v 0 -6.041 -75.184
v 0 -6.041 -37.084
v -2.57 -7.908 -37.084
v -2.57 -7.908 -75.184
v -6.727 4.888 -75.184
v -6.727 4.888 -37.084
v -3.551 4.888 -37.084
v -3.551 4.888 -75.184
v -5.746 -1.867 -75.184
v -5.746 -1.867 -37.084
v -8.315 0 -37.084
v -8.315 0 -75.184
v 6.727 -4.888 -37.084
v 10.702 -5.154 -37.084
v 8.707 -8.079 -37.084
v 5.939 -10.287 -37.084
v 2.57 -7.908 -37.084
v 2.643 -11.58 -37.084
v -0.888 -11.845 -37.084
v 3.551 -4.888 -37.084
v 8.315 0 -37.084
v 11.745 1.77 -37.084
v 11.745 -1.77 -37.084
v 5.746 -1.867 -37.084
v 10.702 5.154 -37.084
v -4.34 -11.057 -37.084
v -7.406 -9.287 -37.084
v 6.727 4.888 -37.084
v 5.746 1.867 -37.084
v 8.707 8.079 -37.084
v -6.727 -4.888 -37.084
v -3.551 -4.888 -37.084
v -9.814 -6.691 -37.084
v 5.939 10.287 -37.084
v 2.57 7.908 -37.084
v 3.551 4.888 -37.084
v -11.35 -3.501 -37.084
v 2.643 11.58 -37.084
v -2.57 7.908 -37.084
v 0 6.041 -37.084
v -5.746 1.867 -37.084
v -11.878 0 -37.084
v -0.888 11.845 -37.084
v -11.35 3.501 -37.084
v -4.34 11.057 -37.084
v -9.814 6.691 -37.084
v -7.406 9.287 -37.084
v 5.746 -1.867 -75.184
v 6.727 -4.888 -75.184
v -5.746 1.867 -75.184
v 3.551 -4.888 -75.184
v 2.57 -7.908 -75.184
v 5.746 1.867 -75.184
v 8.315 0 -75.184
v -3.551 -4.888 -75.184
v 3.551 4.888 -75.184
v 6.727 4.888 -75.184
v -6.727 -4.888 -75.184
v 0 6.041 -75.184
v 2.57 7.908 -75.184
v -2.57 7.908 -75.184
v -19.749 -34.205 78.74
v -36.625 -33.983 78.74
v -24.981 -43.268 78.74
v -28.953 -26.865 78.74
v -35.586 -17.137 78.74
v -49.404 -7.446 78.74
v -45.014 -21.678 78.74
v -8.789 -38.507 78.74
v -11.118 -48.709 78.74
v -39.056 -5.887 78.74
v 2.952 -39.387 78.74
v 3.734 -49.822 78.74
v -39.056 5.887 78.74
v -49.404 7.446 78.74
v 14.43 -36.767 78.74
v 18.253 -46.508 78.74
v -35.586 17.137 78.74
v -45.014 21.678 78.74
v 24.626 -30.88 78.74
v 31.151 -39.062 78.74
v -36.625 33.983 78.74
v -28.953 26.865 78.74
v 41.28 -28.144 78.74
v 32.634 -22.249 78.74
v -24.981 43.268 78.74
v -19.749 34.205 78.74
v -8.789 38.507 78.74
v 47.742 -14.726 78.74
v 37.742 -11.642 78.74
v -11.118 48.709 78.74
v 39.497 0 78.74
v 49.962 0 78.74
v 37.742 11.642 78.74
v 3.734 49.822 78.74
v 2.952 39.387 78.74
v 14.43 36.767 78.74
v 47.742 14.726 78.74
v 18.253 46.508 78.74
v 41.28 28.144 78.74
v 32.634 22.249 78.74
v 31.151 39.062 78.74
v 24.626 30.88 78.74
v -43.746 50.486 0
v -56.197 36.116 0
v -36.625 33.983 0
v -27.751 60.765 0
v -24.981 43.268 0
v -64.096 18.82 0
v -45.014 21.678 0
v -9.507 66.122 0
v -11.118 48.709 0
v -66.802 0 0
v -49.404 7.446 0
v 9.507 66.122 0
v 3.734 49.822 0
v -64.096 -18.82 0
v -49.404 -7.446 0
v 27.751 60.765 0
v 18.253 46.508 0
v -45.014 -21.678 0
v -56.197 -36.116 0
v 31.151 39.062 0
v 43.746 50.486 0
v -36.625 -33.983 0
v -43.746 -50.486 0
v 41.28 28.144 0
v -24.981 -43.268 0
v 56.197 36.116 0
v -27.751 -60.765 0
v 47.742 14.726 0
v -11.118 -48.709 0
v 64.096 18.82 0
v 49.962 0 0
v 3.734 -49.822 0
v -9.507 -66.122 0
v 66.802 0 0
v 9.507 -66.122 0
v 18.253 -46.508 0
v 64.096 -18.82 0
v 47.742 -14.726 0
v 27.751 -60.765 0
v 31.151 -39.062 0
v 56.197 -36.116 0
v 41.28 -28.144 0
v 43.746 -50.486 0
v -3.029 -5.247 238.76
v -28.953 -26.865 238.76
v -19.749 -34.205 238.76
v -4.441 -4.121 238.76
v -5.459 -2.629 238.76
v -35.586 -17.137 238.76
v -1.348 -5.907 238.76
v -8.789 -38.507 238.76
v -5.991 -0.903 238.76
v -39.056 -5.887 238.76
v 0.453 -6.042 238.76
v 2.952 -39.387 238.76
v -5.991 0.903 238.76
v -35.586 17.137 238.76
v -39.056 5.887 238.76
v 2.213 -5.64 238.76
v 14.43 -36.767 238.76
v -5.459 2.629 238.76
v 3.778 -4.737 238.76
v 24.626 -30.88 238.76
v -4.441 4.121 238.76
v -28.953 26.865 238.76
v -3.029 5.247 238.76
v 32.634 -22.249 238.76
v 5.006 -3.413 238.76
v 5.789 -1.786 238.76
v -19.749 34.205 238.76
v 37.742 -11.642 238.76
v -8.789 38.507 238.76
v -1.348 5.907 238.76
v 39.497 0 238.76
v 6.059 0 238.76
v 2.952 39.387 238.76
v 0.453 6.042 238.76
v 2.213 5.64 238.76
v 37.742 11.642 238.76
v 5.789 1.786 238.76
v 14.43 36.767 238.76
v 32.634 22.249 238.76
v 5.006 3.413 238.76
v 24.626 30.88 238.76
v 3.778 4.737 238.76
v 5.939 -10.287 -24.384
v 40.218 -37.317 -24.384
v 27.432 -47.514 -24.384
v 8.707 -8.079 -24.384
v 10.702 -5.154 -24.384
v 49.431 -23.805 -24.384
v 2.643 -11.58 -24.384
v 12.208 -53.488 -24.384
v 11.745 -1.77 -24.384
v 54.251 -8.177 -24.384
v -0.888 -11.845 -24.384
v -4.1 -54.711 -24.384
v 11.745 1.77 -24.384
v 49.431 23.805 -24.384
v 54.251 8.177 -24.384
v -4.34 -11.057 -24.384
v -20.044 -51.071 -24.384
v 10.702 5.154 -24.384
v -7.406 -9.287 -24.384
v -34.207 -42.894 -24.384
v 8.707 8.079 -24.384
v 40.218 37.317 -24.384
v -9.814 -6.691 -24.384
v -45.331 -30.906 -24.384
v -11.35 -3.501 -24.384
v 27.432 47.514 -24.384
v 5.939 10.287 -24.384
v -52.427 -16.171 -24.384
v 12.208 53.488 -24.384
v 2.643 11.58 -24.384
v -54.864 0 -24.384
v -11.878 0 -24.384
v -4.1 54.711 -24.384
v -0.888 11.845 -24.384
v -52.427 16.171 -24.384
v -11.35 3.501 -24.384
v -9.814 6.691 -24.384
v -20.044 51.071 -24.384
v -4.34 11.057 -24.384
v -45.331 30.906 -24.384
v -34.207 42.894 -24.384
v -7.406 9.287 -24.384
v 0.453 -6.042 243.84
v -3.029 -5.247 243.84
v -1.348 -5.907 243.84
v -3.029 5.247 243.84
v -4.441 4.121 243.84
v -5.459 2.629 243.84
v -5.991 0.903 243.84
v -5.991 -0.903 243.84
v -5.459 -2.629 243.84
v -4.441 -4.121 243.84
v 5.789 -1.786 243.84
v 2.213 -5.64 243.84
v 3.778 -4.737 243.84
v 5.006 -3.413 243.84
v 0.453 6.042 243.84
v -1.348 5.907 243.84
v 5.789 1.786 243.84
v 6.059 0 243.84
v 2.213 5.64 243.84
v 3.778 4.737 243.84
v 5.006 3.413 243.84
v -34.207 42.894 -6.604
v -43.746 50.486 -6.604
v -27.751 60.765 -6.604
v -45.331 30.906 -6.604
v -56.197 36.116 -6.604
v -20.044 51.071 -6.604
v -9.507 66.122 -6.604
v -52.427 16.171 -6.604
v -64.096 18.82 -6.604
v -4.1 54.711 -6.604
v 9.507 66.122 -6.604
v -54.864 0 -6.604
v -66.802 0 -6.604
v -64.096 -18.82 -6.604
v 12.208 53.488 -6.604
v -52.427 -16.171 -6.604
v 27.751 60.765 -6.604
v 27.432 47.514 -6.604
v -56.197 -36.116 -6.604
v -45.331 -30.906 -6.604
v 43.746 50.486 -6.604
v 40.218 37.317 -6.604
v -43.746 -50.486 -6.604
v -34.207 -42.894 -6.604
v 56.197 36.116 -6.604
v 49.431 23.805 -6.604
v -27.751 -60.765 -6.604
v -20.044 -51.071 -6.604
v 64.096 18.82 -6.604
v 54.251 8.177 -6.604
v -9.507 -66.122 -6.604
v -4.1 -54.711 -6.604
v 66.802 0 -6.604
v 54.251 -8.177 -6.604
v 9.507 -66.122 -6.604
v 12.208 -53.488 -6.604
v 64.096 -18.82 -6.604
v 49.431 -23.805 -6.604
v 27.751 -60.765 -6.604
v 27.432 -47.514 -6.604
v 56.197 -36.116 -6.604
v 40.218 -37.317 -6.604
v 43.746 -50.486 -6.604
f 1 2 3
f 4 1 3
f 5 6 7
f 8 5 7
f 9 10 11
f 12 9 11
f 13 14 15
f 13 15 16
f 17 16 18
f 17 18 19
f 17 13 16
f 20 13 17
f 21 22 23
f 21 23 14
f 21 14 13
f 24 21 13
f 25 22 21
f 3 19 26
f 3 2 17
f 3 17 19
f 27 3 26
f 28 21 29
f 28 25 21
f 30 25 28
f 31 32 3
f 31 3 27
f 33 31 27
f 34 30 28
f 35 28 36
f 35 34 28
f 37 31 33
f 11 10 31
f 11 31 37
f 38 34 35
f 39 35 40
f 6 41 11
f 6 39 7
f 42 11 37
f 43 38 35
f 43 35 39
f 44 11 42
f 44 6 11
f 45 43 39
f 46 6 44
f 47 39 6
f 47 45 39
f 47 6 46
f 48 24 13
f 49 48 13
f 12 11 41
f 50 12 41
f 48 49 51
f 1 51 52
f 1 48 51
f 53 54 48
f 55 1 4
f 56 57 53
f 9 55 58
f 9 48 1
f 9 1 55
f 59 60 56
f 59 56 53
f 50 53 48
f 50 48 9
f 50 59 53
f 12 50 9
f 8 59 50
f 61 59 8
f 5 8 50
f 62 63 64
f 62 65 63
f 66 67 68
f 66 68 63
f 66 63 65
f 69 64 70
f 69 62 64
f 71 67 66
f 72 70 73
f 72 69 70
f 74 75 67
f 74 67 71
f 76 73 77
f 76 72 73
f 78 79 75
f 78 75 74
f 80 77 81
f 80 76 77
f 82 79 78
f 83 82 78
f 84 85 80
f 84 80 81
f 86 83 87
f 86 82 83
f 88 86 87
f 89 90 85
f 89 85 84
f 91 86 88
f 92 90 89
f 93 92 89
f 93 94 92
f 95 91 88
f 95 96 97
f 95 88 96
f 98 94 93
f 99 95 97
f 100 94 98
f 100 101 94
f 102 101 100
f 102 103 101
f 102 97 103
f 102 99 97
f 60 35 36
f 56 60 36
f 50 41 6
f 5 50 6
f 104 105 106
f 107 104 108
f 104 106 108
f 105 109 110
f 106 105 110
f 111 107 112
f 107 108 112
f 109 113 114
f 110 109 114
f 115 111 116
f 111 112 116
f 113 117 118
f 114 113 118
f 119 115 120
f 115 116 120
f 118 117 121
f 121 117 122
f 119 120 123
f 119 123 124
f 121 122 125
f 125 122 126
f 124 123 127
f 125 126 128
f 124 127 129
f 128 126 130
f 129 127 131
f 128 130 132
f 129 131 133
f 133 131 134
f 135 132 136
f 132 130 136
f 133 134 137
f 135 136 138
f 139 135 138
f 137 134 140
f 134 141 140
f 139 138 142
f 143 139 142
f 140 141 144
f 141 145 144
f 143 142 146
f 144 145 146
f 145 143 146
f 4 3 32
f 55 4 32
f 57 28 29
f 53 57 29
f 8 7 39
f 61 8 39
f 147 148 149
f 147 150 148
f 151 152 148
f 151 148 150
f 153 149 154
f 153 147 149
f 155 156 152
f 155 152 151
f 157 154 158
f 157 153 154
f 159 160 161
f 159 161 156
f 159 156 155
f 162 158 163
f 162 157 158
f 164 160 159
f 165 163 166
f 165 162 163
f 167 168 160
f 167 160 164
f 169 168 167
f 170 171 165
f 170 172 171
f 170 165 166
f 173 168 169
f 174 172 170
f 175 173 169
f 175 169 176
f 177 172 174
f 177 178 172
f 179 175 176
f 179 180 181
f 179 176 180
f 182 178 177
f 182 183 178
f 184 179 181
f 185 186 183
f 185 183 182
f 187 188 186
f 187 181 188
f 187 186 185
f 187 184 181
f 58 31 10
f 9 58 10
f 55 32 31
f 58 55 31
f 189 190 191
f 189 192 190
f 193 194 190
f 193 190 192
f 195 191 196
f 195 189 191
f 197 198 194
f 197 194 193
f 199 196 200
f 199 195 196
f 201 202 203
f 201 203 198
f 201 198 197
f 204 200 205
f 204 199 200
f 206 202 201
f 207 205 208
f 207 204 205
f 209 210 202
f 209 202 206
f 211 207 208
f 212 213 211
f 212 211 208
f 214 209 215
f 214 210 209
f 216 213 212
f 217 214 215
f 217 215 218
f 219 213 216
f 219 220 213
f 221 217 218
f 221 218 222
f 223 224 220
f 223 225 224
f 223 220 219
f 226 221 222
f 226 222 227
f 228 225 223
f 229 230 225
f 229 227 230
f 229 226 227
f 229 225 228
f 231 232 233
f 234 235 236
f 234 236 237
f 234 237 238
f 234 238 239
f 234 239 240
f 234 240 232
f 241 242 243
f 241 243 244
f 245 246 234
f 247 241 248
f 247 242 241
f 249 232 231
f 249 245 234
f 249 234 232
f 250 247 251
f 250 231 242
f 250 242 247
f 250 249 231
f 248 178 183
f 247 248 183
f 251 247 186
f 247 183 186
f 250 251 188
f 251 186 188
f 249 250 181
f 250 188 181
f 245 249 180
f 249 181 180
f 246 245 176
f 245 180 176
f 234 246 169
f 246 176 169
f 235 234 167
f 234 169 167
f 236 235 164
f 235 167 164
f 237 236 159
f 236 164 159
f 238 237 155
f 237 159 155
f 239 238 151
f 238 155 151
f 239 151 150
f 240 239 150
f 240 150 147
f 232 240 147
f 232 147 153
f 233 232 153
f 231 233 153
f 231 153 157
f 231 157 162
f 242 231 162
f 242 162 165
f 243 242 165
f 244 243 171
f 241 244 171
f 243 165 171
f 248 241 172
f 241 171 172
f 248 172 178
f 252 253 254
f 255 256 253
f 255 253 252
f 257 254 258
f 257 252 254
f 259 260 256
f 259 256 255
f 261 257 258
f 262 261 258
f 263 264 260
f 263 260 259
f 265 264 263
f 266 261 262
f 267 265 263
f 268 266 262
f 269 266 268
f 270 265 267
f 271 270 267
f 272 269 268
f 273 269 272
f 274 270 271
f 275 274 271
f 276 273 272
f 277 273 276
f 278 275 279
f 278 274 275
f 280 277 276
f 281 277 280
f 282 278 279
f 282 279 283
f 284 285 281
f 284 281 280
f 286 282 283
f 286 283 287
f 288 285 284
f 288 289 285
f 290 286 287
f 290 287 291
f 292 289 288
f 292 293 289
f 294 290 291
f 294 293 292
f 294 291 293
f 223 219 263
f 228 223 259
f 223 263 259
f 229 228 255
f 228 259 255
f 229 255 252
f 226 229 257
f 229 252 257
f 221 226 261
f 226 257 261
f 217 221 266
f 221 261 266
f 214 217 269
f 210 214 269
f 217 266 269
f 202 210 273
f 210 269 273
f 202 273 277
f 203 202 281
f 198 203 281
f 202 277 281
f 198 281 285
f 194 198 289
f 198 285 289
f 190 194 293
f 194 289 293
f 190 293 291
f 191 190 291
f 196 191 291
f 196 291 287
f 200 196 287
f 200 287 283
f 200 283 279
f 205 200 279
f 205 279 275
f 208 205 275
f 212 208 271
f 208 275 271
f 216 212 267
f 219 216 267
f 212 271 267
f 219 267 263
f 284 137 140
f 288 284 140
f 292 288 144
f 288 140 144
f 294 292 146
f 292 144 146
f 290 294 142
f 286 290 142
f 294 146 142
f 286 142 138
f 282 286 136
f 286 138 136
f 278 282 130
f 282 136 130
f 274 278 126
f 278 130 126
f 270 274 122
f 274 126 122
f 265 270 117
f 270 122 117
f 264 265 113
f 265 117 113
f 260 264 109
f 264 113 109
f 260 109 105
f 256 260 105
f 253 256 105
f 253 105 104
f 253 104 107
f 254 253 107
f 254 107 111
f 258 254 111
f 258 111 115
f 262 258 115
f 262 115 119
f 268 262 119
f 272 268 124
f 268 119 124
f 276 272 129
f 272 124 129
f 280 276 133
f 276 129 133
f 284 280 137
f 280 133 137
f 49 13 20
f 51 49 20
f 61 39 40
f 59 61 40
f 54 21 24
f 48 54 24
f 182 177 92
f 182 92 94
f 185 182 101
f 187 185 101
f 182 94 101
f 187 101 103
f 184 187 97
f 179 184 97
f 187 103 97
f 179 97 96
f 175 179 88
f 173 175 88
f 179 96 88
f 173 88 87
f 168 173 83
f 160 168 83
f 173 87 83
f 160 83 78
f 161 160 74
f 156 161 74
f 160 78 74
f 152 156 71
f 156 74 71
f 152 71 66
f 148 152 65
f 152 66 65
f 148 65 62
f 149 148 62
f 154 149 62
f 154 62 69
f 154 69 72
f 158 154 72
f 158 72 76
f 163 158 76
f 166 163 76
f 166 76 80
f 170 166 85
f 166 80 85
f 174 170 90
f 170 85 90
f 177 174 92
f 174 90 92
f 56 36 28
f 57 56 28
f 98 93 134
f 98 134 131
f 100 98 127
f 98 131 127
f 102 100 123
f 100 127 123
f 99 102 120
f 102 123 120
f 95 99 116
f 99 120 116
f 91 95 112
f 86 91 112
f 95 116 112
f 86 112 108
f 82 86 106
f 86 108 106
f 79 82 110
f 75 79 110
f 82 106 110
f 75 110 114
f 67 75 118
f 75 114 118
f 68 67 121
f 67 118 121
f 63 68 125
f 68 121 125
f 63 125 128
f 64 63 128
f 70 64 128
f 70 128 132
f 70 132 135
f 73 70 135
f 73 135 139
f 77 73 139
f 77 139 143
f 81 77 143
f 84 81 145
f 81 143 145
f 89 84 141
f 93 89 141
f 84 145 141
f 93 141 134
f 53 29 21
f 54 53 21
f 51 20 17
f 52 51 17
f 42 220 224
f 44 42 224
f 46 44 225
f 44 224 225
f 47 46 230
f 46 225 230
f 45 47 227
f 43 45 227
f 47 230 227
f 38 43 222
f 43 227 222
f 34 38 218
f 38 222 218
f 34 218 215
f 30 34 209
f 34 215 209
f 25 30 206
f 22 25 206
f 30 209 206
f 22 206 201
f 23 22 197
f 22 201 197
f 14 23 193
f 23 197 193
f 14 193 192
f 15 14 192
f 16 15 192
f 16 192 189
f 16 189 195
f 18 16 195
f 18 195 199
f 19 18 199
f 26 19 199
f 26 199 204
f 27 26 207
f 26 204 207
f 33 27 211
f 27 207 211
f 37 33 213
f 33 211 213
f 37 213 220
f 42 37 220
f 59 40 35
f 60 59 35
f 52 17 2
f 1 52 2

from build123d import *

# Parameters (mm, degrees)
SKETCH1_R           = 49.9618
BOSS_EXTRUDE1_DEPTH = 78.74
SKETCH2_R           = 66.802
BOSS_EXTRUDE2_DEPTH = 6.604
SKETCH3_R           = 54.864
BOSS_EXTRUDE3_DEPTH = 17.78
SKETCH4_R           = 11.878006526
BOSS_EXTRUDE4_DEPTH = 12.7
BOSS_EXTRUDE5_DEPTH = 38.1
SKETCH7_R           = 39.497
BOSS_EXTRUDE6_DEPTH = 160.02
SKETCH8_R           = 6.058651835
BOSS_EXTRUDE7_DEPTH = 5.08


with BuildPart() as part:
    # Sketch1 → Boss-Extrude1 (new body)
    with BuildSketch(Plane.XY):
        Circle(SKETCH1_R)
    extrude(amount=BOSS_EXTRUDE1_DEPTH)

    # Sketch2 → Boss-Extrude2 (add)
    with BuildSketch(Plane(origin=(0, 0, 0), x_dir=(-1, 0, 0), z_dir=(0, 0, -1))):
        with Locations(Location((0, 0, 0), (0, 0, 180))):
            Circle(SKETCH2_R)
    extrude(amount=BOSS_EXTRUDE2_DEPTH)

    # Sketch3 → Boss-Extrude3 (add)
    with BuildSketch(Plane(origin=(0, 0, -6.604), x_dir=(-1, 0, 0), z_dir=(0, 0, -1))):
        Circle(SKETCH3_R)
    extrude(amount=BOSS_EXTRUDE3_DEPTH)

    # Sketch4 → Boss-Extrude4 (add)
    with BuildSketch(Plane(origin=(0, 0, -24.384), x_dir=(-1, 0, 0), z_dir=(0, 0, -1))):
        Circle(SKETCH4_R)
    extrude(amount=BOSS_EXTRUDE4_DEPTH)

    # Sketch5 → Boss-Extrude5 (add)
    with BuildSketch(Plane(origin=(0, 0, -37.084), x_dir=(-1, 0, 0), z_dir=(0, 0, -1))):
        Polygon((8.315334724, 0), (5.74575498, 1.866908963), (6.727247106, 4.887631119), (3.551071869, 4.887631119), (2.569579744, 7.908353274), (0, 6.041444312), (-2.569579744, 7.908353274), (-3.551071869, 4.887631119), (-6.727247106, 4.887631119), (-5.74575498, 1.866908963), (-8.315334724, 0), (-5.74575498, -1.866908963), (-6.727247106, -4.887631119), (-3.551071869, -4.887631119), (-2.569579744, -7.908353274), (0, -6.041444312), (2.569579744, -7.908353274), (3.551071869, -4.887631119), (6.727247106, -4.887631119), (5.74575498, -1.866908963), align=None)
    extrude(amount=BOSS_EXTRUDE5_DEPTH)

    # Sketch7 → Boss-Extrude6 (add)
    with BuildSketch(Plane.XY.offset(78.74)):
        Circle(SKETCH7_R)
    extrude(amount=BOSS_EXTRUDE6_DEPTH)

    # Sketch8 → Boss-Extrude7 (add)
    with BuildSketch(Plane.XY.offset(238.76)):
        Circle(SKETCH8_R)
    extrude(amount=BOSS_EXTRUDE7_DEPTH)


solid = part.part
